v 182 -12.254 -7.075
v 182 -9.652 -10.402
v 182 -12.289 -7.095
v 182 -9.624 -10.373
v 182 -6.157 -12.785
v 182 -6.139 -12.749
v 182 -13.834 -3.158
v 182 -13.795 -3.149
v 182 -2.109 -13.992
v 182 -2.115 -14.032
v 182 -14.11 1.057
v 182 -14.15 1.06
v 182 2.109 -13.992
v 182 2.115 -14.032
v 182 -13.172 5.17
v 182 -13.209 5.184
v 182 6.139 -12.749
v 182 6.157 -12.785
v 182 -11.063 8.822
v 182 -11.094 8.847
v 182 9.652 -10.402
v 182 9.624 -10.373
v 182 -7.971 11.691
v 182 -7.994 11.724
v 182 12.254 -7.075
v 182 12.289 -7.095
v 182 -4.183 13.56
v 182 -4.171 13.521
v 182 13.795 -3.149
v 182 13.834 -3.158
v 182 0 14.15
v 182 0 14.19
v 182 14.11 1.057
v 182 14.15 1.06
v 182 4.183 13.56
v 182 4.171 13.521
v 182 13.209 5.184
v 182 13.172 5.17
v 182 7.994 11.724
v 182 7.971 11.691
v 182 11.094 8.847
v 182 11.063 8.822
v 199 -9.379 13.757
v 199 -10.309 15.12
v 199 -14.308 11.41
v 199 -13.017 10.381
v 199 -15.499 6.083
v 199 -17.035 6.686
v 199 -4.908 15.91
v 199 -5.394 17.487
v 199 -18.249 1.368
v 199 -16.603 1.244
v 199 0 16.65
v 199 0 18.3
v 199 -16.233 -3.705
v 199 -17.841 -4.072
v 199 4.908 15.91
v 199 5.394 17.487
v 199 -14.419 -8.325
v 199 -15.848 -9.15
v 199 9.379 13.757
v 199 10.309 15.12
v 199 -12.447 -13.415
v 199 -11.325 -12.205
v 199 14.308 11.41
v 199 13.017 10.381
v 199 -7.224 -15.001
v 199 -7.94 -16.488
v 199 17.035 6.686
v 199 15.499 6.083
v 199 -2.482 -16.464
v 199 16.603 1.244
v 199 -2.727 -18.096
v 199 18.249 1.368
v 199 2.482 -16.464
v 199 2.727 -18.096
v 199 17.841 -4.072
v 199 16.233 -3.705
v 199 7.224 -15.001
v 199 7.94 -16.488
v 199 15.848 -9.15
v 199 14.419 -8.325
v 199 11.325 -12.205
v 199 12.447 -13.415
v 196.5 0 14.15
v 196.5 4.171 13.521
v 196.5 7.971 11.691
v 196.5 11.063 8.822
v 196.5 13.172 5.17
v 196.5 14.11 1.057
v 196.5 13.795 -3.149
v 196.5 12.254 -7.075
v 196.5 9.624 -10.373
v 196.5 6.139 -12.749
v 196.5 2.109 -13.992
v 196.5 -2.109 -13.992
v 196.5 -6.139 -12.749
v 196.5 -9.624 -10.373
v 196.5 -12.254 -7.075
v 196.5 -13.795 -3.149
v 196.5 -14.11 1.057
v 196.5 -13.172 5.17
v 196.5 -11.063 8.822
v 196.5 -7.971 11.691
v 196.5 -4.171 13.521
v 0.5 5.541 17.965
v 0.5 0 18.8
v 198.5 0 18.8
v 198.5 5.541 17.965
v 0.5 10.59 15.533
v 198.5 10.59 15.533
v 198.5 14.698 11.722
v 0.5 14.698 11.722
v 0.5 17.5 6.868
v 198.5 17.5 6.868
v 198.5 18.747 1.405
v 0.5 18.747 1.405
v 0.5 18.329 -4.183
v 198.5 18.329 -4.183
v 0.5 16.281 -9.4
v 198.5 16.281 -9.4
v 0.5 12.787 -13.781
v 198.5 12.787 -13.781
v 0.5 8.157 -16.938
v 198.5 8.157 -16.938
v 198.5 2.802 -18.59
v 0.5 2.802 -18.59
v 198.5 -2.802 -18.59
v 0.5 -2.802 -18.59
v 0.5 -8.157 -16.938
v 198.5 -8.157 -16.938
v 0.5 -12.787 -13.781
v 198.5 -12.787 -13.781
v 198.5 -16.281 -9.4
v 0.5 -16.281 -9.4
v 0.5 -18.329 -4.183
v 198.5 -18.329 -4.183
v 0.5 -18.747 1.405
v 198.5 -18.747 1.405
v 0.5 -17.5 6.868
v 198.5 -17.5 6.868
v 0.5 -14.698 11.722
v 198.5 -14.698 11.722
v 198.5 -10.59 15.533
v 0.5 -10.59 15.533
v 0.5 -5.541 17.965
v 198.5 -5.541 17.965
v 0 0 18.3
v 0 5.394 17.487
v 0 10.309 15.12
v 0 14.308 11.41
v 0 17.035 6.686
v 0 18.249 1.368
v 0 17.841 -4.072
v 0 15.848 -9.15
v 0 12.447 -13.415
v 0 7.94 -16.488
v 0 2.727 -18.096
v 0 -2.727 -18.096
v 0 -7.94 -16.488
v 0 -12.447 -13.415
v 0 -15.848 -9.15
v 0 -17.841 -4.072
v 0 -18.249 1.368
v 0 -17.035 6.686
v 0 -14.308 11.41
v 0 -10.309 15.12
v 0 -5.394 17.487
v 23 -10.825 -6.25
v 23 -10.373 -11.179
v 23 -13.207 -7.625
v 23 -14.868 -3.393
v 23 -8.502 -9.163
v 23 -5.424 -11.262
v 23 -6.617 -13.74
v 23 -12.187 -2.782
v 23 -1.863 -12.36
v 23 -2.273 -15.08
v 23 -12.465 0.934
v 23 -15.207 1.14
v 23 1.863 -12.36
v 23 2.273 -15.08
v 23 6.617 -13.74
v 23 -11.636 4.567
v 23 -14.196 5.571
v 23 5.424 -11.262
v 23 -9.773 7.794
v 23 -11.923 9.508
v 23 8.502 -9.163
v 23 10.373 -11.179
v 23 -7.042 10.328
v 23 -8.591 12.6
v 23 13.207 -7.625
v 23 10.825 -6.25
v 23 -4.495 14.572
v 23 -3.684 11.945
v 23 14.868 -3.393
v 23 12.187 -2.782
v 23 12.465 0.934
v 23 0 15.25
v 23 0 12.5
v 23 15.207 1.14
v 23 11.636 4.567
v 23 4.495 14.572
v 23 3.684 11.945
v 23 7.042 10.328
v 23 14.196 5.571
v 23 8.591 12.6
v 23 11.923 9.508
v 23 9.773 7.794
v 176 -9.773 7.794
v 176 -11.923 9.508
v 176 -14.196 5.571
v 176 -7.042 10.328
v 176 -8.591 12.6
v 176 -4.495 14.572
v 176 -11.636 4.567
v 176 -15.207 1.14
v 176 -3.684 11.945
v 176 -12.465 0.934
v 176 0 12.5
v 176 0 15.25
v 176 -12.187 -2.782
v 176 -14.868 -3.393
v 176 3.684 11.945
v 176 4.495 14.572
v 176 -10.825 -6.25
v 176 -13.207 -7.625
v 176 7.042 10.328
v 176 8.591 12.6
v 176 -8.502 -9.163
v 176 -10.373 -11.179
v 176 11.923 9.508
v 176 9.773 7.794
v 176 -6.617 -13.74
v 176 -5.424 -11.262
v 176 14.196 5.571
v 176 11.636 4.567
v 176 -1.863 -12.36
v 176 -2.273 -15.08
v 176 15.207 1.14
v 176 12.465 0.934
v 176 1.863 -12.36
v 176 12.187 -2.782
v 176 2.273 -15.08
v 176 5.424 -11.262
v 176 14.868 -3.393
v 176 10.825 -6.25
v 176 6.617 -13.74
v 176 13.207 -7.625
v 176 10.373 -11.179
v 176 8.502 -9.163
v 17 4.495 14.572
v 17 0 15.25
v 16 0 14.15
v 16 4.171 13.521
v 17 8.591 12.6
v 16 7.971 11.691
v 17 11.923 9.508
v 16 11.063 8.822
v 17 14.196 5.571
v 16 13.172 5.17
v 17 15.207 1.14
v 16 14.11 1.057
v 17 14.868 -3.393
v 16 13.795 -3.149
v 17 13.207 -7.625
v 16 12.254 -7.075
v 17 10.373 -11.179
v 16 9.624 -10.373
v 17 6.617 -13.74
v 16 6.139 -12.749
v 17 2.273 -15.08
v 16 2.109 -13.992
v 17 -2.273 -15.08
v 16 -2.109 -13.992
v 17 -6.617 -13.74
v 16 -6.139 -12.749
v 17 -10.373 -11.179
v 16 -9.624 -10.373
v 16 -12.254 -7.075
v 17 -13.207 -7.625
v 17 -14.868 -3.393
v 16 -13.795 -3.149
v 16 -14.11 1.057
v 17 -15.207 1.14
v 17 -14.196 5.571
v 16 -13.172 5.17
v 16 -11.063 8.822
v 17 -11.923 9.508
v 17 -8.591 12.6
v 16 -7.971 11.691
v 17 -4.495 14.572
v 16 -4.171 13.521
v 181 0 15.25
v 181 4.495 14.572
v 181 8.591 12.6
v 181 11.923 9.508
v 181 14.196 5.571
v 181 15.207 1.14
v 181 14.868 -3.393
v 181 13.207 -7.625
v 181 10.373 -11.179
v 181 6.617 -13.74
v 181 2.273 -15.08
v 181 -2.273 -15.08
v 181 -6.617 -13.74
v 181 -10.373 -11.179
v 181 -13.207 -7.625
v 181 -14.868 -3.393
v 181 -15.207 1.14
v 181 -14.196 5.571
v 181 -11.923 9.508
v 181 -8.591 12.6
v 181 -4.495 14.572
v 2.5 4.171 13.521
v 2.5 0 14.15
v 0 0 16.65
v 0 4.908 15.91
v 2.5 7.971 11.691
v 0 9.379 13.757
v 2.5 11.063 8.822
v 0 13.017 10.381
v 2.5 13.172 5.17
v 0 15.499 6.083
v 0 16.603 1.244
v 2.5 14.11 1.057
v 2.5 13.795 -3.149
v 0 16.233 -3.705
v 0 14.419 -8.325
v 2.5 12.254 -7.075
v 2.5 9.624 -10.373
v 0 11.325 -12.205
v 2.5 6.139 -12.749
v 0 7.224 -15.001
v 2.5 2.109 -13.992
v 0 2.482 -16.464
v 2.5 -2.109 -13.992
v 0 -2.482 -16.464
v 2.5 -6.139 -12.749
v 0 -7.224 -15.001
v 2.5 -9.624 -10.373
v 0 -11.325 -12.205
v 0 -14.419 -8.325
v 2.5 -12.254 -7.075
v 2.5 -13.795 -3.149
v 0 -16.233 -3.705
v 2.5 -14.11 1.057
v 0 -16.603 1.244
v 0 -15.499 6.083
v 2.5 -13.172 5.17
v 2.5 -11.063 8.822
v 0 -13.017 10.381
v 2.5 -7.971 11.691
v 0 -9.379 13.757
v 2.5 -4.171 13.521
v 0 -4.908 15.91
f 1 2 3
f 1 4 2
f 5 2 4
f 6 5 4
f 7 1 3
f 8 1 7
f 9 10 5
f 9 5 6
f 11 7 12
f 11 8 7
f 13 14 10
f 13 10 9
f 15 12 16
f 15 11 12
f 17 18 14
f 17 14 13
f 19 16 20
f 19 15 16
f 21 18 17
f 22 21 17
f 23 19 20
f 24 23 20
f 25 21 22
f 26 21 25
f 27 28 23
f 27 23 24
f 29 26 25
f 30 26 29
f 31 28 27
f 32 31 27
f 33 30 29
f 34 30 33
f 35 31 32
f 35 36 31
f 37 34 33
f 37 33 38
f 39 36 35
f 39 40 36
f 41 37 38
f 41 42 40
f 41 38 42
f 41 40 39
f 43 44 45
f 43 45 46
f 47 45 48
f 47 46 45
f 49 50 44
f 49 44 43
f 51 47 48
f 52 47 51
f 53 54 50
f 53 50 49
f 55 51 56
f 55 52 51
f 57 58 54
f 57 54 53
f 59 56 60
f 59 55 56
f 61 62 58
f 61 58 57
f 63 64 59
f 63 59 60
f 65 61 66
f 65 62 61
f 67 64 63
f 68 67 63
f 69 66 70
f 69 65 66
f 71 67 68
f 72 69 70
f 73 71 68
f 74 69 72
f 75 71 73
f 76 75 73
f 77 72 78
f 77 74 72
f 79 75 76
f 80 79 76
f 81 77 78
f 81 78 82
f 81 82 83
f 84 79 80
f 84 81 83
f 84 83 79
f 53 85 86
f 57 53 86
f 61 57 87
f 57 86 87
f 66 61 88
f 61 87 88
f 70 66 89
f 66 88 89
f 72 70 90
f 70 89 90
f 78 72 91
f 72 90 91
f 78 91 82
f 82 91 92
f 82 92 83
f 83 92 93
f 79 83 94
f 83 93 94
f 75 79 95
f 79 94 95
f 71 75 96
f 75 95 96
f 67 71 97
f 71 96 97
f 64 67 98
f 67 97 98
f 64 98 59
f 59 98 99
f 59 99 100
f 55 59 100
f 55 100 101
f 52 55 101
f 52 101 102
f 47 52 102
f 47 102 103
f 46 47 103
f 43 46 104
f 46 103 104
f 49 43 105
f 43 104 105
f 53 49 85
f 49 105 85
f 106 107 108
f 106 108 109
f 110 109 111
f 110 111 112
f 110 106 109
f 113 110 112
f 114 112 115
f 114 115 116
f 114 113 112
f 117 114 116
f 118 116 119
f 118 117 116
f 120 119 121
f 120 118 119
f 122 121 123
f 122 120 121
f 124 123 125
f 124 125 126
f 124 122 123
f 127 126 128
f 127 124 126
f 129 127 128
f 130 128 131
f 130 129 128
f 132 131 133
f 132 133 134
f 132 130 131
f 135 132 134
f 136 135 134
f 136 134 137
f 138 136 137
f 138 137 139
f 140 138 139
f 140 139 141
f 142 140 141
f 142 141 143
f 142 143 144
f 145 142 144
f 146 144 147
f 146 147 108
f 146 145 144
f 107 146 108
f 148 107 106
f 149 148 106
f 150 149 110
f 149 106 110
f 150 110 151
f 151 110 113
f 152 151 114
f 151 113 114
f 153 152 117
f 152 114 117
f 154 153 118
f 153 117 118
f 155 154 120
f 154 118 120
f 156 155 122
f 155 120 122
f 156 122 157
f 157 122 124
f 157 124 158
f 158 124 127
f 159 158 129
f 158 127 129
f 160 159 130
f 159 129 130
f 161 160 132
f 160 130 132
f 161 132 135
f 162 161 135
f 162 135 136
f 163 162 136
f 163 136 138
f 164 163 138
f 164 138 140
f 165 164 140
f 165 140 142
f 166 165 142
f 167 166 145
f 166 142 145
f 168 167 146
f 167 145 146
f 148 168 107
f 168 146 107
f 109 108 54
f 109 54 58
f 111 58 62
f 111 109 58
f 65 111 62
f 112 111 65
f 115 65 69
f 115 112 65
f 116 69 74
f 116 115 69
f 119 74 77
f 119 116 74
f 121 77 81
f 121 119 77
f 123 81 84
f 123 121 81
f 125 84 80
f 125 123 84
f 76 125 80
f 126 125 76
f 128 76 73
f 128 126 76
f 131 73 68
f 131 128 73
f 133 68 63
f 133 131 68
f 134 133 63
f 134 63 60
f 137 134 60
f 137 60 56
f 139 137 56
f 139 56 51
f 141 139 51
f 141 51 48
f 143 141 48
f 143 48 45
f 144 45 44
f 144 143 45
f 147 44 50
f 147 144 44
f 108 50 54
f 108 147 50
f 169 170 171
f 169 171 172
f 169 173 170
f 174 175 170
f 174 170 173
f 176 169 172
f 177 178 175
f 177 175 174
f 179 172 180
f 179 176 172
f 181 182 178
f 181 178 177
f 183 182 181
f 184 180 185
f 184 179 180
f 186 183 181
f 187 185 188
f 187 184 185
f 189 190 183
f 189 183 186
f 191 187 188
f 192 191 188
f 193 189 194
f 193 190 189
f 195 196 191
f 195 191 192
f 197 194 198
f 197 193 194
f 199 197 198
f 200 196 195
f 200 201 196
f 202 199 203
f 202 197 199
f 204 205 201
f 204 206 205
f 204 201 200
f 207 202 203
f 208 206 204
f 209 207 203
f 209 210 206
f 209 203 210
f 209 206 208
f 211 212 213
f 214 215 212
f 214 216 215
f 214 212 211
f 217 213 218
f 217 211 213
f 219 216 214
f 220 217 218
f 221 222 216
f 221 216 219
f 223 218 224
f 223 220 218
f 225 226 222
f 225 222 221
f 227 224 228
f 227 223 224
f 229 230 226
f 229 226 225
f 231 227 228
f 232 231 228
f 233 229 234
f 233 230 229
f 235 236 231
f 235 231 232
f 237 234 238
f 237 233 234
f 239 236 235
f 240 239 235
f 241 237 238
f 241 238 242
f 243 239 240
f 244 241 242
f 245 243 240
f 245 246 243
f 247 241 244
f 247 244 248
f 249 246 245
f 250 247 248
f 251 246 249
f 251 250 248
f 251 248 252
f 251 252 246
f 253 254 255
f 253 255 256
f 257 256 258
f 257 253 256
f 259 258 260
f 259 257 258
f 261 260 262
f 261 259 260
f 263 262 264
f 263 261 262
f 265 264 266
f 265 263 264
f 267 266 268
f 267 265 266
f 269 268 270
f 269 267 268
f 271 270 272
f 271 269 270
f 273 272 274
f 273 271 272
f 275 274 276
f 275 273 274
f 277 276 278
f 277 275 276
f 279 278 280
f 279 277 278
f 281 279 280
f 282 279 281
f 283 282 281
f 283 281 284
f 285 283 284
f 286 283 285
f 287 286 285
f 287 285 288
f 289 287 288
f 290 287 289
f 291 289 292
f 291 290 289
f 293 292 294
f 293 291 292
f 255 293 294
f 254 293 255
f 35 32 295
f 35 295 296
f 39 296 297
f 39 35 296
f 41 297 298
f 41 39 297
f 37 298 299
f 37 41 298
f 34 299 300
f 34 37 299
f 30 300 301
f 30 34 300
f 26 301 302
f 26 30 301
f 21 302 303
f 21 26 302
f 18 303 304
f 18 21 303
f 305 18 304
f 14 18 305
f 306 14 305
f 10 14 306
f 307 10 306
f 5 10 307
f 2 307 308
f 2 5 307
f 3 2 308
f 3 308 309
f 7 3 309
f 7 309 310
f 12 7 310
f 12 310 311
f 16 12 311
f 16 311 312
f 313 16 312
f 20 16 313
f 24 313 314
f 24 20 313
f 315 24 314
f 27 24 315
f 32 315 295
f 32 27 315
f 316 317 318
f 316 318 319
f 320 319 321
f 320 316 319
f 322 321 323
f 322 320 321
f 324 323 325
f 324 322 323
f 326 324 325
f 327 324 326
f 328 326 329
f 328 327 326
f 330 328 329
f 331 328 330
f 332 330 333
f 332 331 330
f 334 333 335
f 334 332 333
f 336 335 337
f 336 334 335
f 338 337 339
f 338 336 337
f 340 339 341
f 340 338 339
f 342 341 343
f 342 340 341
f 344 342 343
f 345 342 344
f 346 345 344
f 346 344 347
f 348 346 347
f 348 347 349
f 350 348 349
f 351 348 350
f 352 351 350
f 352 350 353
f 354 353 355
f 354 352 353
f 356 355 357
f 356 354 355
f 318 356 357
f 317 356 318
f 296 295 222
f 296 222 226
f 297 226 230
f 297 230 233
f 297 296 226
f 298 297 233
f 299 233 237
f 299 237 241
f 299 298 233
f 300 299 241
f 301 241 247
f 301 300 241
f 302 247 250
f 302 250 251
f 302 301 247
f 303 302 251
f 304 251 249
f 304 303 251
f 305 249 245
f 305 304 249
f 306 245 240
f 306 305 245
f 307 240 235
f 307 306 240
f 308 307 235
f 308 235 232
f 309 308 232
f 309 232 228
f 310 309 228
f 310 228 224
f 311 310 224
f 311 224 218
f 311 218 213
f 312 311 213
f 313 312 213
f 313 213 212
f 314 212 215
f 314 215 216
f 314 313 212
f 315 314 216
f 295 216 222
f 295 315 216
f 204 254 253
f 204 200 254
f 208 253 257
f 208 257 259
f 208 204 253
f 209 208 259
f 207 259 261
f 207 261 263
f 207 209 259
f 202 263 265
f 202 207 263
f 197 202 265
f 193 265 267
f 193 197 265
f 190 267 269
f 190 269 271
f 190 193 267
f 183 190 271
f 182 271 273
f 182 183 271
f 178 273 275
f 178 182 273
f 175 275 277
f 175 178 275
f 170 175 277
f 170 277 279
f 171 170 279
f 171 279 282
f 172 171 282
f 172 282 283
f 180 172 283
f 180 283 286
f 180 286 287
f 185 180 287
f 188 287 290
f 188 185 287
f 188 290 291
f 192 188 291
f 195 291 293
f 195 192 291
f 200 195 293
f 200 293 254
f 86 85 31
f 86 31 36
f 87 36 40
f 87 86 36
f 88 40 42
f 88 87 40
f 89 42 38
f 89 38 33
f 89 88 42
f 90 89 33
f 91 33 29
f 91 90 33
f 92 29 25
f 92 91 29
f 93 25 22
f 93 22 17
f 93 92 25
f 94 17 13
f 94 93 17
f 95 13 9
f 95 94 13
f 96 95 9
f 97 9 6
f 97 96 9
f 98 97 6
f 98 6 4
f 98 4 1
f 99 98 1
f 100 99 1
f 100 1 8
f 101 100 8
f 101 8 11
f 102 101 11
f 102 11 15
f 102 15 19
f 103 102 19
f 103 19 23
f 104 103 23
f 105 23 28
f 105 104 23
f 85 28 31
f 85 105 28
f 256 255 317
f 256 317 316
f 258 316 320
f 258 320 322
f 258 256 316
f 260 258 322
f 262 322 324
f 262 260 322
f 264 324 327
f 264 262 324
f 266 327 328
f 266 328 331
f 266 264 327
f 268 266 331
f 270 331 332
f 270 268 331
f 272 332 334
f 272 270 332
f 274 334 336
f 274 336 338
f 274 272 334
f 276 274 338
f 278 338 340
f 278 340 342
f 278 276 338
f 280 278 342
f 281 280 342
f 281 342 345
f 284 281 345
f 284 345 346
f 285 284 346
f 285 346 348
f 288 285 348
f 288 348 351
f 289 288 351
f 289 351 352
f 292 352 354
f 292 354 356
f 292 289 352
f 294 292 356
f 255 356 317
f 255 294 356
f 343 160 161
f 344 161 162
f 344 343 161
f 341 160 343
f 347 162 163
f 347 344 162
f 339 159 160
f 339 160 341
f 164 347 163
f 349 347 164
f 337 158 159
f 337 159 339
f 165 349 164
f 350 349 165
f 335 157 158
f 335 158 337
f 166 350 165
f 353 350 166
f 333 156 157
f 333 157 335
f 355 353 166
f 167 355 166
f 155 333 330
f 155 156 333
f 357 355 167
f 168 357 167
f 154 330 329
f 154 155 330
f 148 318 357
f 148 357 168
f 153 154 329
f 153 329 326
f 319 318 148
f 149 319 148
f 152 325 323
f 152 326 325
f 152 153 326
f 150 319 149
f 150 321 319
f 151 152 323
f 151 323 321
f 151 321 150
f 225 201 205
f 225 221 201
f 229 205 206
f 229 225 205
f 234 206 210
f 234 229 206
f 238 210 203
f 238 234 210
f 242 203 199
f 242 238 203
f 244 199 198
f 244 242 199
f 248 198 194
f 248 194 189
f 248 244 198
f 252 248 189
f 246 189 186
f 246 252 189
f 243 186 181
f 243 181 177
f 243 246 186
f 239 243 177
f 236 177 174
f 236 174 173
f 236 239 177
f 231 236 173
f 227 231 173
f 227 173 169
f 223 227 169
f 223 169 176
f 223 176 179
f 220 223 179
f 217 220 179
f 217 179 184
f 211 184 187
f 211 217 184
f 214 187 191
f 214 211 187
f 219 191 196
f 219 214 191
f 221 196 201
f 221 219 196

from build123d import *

# Parameters (mm, degrees)
F2_SIZE  = 0.5
F3_SIZE  = 2.5
F4_SIZE  = 2.5
F5_SIZE2 = 1.09999
F5_SIZE  = 0.99999
F6_SIZE2 = 1.06
F6_SIZE  = 1


# Not quite as in the source:
# - a fillet or chamfer is up to 0.001 mm smaller than in the source, because OpenCascade refuses the exact size


with BuildPart() as f1:
    # F0 (on Front) → F1 (revolve)
    with BuildSketch(Plane.XZ):
        Polygon((0, 18.8), (0, 14.15), (17, 14.15), (17, 15.25), (23, 15.25), (23, 12.5), (99.5, 12.5), (99.5, 18.8), align=None)
        Polygon((199, 18.8), (99.5, 18.8), (99.5, 12.5), (176, 12.5), (176, 15.25), (182, 15.25), (182, 14.15), (199, 14.15), align=None)
    revolve(axis=Axis((99.5, 0, 0), (-1, 0, 0)))

    # F2
    f2_edges = [f1.edges().sort_by_distance(p)[0] for p in [
        (199, 0, -18.8),
        (0, 0, -18.8),
    ]]
    chamfer(f2_edges, length=F2_SIZE)

    # F3
    f3_edges = [f1.edges().sort_by_distance(p)[0] for p in [
        (0, 0, -14.15),
    ]]
    chamfer(f3_edges, length=F3_SIZE)

    # F4
    f4_edges = [f1.edges().sort_by_distance(p)[0] for p in [
        (199, 0, -14.15),
    ]]
    chamfer(f4_edges, length=F4_SIZE)

    # F5 (size 1 and 1.1 in the source; OpenCascade refuses exactly that, so slightly less here)
    f5_edges = [f1.edges().sort_by_distance(p)[0] for p in [
        (17, 0, -14.15),
    ]]
    chamfer(f5_edges, length=F5_SIZE, length2=F5_SIZE2)

    # F6
    f6_edges = [f1.edges().sort_by_distance(p)[0] for p in [
        (182, 0, -15.25),
    ]]
    chamfer(f6_edges, length=F6_SIZE, length2=F6_SIZE2)


solid = f1.part
